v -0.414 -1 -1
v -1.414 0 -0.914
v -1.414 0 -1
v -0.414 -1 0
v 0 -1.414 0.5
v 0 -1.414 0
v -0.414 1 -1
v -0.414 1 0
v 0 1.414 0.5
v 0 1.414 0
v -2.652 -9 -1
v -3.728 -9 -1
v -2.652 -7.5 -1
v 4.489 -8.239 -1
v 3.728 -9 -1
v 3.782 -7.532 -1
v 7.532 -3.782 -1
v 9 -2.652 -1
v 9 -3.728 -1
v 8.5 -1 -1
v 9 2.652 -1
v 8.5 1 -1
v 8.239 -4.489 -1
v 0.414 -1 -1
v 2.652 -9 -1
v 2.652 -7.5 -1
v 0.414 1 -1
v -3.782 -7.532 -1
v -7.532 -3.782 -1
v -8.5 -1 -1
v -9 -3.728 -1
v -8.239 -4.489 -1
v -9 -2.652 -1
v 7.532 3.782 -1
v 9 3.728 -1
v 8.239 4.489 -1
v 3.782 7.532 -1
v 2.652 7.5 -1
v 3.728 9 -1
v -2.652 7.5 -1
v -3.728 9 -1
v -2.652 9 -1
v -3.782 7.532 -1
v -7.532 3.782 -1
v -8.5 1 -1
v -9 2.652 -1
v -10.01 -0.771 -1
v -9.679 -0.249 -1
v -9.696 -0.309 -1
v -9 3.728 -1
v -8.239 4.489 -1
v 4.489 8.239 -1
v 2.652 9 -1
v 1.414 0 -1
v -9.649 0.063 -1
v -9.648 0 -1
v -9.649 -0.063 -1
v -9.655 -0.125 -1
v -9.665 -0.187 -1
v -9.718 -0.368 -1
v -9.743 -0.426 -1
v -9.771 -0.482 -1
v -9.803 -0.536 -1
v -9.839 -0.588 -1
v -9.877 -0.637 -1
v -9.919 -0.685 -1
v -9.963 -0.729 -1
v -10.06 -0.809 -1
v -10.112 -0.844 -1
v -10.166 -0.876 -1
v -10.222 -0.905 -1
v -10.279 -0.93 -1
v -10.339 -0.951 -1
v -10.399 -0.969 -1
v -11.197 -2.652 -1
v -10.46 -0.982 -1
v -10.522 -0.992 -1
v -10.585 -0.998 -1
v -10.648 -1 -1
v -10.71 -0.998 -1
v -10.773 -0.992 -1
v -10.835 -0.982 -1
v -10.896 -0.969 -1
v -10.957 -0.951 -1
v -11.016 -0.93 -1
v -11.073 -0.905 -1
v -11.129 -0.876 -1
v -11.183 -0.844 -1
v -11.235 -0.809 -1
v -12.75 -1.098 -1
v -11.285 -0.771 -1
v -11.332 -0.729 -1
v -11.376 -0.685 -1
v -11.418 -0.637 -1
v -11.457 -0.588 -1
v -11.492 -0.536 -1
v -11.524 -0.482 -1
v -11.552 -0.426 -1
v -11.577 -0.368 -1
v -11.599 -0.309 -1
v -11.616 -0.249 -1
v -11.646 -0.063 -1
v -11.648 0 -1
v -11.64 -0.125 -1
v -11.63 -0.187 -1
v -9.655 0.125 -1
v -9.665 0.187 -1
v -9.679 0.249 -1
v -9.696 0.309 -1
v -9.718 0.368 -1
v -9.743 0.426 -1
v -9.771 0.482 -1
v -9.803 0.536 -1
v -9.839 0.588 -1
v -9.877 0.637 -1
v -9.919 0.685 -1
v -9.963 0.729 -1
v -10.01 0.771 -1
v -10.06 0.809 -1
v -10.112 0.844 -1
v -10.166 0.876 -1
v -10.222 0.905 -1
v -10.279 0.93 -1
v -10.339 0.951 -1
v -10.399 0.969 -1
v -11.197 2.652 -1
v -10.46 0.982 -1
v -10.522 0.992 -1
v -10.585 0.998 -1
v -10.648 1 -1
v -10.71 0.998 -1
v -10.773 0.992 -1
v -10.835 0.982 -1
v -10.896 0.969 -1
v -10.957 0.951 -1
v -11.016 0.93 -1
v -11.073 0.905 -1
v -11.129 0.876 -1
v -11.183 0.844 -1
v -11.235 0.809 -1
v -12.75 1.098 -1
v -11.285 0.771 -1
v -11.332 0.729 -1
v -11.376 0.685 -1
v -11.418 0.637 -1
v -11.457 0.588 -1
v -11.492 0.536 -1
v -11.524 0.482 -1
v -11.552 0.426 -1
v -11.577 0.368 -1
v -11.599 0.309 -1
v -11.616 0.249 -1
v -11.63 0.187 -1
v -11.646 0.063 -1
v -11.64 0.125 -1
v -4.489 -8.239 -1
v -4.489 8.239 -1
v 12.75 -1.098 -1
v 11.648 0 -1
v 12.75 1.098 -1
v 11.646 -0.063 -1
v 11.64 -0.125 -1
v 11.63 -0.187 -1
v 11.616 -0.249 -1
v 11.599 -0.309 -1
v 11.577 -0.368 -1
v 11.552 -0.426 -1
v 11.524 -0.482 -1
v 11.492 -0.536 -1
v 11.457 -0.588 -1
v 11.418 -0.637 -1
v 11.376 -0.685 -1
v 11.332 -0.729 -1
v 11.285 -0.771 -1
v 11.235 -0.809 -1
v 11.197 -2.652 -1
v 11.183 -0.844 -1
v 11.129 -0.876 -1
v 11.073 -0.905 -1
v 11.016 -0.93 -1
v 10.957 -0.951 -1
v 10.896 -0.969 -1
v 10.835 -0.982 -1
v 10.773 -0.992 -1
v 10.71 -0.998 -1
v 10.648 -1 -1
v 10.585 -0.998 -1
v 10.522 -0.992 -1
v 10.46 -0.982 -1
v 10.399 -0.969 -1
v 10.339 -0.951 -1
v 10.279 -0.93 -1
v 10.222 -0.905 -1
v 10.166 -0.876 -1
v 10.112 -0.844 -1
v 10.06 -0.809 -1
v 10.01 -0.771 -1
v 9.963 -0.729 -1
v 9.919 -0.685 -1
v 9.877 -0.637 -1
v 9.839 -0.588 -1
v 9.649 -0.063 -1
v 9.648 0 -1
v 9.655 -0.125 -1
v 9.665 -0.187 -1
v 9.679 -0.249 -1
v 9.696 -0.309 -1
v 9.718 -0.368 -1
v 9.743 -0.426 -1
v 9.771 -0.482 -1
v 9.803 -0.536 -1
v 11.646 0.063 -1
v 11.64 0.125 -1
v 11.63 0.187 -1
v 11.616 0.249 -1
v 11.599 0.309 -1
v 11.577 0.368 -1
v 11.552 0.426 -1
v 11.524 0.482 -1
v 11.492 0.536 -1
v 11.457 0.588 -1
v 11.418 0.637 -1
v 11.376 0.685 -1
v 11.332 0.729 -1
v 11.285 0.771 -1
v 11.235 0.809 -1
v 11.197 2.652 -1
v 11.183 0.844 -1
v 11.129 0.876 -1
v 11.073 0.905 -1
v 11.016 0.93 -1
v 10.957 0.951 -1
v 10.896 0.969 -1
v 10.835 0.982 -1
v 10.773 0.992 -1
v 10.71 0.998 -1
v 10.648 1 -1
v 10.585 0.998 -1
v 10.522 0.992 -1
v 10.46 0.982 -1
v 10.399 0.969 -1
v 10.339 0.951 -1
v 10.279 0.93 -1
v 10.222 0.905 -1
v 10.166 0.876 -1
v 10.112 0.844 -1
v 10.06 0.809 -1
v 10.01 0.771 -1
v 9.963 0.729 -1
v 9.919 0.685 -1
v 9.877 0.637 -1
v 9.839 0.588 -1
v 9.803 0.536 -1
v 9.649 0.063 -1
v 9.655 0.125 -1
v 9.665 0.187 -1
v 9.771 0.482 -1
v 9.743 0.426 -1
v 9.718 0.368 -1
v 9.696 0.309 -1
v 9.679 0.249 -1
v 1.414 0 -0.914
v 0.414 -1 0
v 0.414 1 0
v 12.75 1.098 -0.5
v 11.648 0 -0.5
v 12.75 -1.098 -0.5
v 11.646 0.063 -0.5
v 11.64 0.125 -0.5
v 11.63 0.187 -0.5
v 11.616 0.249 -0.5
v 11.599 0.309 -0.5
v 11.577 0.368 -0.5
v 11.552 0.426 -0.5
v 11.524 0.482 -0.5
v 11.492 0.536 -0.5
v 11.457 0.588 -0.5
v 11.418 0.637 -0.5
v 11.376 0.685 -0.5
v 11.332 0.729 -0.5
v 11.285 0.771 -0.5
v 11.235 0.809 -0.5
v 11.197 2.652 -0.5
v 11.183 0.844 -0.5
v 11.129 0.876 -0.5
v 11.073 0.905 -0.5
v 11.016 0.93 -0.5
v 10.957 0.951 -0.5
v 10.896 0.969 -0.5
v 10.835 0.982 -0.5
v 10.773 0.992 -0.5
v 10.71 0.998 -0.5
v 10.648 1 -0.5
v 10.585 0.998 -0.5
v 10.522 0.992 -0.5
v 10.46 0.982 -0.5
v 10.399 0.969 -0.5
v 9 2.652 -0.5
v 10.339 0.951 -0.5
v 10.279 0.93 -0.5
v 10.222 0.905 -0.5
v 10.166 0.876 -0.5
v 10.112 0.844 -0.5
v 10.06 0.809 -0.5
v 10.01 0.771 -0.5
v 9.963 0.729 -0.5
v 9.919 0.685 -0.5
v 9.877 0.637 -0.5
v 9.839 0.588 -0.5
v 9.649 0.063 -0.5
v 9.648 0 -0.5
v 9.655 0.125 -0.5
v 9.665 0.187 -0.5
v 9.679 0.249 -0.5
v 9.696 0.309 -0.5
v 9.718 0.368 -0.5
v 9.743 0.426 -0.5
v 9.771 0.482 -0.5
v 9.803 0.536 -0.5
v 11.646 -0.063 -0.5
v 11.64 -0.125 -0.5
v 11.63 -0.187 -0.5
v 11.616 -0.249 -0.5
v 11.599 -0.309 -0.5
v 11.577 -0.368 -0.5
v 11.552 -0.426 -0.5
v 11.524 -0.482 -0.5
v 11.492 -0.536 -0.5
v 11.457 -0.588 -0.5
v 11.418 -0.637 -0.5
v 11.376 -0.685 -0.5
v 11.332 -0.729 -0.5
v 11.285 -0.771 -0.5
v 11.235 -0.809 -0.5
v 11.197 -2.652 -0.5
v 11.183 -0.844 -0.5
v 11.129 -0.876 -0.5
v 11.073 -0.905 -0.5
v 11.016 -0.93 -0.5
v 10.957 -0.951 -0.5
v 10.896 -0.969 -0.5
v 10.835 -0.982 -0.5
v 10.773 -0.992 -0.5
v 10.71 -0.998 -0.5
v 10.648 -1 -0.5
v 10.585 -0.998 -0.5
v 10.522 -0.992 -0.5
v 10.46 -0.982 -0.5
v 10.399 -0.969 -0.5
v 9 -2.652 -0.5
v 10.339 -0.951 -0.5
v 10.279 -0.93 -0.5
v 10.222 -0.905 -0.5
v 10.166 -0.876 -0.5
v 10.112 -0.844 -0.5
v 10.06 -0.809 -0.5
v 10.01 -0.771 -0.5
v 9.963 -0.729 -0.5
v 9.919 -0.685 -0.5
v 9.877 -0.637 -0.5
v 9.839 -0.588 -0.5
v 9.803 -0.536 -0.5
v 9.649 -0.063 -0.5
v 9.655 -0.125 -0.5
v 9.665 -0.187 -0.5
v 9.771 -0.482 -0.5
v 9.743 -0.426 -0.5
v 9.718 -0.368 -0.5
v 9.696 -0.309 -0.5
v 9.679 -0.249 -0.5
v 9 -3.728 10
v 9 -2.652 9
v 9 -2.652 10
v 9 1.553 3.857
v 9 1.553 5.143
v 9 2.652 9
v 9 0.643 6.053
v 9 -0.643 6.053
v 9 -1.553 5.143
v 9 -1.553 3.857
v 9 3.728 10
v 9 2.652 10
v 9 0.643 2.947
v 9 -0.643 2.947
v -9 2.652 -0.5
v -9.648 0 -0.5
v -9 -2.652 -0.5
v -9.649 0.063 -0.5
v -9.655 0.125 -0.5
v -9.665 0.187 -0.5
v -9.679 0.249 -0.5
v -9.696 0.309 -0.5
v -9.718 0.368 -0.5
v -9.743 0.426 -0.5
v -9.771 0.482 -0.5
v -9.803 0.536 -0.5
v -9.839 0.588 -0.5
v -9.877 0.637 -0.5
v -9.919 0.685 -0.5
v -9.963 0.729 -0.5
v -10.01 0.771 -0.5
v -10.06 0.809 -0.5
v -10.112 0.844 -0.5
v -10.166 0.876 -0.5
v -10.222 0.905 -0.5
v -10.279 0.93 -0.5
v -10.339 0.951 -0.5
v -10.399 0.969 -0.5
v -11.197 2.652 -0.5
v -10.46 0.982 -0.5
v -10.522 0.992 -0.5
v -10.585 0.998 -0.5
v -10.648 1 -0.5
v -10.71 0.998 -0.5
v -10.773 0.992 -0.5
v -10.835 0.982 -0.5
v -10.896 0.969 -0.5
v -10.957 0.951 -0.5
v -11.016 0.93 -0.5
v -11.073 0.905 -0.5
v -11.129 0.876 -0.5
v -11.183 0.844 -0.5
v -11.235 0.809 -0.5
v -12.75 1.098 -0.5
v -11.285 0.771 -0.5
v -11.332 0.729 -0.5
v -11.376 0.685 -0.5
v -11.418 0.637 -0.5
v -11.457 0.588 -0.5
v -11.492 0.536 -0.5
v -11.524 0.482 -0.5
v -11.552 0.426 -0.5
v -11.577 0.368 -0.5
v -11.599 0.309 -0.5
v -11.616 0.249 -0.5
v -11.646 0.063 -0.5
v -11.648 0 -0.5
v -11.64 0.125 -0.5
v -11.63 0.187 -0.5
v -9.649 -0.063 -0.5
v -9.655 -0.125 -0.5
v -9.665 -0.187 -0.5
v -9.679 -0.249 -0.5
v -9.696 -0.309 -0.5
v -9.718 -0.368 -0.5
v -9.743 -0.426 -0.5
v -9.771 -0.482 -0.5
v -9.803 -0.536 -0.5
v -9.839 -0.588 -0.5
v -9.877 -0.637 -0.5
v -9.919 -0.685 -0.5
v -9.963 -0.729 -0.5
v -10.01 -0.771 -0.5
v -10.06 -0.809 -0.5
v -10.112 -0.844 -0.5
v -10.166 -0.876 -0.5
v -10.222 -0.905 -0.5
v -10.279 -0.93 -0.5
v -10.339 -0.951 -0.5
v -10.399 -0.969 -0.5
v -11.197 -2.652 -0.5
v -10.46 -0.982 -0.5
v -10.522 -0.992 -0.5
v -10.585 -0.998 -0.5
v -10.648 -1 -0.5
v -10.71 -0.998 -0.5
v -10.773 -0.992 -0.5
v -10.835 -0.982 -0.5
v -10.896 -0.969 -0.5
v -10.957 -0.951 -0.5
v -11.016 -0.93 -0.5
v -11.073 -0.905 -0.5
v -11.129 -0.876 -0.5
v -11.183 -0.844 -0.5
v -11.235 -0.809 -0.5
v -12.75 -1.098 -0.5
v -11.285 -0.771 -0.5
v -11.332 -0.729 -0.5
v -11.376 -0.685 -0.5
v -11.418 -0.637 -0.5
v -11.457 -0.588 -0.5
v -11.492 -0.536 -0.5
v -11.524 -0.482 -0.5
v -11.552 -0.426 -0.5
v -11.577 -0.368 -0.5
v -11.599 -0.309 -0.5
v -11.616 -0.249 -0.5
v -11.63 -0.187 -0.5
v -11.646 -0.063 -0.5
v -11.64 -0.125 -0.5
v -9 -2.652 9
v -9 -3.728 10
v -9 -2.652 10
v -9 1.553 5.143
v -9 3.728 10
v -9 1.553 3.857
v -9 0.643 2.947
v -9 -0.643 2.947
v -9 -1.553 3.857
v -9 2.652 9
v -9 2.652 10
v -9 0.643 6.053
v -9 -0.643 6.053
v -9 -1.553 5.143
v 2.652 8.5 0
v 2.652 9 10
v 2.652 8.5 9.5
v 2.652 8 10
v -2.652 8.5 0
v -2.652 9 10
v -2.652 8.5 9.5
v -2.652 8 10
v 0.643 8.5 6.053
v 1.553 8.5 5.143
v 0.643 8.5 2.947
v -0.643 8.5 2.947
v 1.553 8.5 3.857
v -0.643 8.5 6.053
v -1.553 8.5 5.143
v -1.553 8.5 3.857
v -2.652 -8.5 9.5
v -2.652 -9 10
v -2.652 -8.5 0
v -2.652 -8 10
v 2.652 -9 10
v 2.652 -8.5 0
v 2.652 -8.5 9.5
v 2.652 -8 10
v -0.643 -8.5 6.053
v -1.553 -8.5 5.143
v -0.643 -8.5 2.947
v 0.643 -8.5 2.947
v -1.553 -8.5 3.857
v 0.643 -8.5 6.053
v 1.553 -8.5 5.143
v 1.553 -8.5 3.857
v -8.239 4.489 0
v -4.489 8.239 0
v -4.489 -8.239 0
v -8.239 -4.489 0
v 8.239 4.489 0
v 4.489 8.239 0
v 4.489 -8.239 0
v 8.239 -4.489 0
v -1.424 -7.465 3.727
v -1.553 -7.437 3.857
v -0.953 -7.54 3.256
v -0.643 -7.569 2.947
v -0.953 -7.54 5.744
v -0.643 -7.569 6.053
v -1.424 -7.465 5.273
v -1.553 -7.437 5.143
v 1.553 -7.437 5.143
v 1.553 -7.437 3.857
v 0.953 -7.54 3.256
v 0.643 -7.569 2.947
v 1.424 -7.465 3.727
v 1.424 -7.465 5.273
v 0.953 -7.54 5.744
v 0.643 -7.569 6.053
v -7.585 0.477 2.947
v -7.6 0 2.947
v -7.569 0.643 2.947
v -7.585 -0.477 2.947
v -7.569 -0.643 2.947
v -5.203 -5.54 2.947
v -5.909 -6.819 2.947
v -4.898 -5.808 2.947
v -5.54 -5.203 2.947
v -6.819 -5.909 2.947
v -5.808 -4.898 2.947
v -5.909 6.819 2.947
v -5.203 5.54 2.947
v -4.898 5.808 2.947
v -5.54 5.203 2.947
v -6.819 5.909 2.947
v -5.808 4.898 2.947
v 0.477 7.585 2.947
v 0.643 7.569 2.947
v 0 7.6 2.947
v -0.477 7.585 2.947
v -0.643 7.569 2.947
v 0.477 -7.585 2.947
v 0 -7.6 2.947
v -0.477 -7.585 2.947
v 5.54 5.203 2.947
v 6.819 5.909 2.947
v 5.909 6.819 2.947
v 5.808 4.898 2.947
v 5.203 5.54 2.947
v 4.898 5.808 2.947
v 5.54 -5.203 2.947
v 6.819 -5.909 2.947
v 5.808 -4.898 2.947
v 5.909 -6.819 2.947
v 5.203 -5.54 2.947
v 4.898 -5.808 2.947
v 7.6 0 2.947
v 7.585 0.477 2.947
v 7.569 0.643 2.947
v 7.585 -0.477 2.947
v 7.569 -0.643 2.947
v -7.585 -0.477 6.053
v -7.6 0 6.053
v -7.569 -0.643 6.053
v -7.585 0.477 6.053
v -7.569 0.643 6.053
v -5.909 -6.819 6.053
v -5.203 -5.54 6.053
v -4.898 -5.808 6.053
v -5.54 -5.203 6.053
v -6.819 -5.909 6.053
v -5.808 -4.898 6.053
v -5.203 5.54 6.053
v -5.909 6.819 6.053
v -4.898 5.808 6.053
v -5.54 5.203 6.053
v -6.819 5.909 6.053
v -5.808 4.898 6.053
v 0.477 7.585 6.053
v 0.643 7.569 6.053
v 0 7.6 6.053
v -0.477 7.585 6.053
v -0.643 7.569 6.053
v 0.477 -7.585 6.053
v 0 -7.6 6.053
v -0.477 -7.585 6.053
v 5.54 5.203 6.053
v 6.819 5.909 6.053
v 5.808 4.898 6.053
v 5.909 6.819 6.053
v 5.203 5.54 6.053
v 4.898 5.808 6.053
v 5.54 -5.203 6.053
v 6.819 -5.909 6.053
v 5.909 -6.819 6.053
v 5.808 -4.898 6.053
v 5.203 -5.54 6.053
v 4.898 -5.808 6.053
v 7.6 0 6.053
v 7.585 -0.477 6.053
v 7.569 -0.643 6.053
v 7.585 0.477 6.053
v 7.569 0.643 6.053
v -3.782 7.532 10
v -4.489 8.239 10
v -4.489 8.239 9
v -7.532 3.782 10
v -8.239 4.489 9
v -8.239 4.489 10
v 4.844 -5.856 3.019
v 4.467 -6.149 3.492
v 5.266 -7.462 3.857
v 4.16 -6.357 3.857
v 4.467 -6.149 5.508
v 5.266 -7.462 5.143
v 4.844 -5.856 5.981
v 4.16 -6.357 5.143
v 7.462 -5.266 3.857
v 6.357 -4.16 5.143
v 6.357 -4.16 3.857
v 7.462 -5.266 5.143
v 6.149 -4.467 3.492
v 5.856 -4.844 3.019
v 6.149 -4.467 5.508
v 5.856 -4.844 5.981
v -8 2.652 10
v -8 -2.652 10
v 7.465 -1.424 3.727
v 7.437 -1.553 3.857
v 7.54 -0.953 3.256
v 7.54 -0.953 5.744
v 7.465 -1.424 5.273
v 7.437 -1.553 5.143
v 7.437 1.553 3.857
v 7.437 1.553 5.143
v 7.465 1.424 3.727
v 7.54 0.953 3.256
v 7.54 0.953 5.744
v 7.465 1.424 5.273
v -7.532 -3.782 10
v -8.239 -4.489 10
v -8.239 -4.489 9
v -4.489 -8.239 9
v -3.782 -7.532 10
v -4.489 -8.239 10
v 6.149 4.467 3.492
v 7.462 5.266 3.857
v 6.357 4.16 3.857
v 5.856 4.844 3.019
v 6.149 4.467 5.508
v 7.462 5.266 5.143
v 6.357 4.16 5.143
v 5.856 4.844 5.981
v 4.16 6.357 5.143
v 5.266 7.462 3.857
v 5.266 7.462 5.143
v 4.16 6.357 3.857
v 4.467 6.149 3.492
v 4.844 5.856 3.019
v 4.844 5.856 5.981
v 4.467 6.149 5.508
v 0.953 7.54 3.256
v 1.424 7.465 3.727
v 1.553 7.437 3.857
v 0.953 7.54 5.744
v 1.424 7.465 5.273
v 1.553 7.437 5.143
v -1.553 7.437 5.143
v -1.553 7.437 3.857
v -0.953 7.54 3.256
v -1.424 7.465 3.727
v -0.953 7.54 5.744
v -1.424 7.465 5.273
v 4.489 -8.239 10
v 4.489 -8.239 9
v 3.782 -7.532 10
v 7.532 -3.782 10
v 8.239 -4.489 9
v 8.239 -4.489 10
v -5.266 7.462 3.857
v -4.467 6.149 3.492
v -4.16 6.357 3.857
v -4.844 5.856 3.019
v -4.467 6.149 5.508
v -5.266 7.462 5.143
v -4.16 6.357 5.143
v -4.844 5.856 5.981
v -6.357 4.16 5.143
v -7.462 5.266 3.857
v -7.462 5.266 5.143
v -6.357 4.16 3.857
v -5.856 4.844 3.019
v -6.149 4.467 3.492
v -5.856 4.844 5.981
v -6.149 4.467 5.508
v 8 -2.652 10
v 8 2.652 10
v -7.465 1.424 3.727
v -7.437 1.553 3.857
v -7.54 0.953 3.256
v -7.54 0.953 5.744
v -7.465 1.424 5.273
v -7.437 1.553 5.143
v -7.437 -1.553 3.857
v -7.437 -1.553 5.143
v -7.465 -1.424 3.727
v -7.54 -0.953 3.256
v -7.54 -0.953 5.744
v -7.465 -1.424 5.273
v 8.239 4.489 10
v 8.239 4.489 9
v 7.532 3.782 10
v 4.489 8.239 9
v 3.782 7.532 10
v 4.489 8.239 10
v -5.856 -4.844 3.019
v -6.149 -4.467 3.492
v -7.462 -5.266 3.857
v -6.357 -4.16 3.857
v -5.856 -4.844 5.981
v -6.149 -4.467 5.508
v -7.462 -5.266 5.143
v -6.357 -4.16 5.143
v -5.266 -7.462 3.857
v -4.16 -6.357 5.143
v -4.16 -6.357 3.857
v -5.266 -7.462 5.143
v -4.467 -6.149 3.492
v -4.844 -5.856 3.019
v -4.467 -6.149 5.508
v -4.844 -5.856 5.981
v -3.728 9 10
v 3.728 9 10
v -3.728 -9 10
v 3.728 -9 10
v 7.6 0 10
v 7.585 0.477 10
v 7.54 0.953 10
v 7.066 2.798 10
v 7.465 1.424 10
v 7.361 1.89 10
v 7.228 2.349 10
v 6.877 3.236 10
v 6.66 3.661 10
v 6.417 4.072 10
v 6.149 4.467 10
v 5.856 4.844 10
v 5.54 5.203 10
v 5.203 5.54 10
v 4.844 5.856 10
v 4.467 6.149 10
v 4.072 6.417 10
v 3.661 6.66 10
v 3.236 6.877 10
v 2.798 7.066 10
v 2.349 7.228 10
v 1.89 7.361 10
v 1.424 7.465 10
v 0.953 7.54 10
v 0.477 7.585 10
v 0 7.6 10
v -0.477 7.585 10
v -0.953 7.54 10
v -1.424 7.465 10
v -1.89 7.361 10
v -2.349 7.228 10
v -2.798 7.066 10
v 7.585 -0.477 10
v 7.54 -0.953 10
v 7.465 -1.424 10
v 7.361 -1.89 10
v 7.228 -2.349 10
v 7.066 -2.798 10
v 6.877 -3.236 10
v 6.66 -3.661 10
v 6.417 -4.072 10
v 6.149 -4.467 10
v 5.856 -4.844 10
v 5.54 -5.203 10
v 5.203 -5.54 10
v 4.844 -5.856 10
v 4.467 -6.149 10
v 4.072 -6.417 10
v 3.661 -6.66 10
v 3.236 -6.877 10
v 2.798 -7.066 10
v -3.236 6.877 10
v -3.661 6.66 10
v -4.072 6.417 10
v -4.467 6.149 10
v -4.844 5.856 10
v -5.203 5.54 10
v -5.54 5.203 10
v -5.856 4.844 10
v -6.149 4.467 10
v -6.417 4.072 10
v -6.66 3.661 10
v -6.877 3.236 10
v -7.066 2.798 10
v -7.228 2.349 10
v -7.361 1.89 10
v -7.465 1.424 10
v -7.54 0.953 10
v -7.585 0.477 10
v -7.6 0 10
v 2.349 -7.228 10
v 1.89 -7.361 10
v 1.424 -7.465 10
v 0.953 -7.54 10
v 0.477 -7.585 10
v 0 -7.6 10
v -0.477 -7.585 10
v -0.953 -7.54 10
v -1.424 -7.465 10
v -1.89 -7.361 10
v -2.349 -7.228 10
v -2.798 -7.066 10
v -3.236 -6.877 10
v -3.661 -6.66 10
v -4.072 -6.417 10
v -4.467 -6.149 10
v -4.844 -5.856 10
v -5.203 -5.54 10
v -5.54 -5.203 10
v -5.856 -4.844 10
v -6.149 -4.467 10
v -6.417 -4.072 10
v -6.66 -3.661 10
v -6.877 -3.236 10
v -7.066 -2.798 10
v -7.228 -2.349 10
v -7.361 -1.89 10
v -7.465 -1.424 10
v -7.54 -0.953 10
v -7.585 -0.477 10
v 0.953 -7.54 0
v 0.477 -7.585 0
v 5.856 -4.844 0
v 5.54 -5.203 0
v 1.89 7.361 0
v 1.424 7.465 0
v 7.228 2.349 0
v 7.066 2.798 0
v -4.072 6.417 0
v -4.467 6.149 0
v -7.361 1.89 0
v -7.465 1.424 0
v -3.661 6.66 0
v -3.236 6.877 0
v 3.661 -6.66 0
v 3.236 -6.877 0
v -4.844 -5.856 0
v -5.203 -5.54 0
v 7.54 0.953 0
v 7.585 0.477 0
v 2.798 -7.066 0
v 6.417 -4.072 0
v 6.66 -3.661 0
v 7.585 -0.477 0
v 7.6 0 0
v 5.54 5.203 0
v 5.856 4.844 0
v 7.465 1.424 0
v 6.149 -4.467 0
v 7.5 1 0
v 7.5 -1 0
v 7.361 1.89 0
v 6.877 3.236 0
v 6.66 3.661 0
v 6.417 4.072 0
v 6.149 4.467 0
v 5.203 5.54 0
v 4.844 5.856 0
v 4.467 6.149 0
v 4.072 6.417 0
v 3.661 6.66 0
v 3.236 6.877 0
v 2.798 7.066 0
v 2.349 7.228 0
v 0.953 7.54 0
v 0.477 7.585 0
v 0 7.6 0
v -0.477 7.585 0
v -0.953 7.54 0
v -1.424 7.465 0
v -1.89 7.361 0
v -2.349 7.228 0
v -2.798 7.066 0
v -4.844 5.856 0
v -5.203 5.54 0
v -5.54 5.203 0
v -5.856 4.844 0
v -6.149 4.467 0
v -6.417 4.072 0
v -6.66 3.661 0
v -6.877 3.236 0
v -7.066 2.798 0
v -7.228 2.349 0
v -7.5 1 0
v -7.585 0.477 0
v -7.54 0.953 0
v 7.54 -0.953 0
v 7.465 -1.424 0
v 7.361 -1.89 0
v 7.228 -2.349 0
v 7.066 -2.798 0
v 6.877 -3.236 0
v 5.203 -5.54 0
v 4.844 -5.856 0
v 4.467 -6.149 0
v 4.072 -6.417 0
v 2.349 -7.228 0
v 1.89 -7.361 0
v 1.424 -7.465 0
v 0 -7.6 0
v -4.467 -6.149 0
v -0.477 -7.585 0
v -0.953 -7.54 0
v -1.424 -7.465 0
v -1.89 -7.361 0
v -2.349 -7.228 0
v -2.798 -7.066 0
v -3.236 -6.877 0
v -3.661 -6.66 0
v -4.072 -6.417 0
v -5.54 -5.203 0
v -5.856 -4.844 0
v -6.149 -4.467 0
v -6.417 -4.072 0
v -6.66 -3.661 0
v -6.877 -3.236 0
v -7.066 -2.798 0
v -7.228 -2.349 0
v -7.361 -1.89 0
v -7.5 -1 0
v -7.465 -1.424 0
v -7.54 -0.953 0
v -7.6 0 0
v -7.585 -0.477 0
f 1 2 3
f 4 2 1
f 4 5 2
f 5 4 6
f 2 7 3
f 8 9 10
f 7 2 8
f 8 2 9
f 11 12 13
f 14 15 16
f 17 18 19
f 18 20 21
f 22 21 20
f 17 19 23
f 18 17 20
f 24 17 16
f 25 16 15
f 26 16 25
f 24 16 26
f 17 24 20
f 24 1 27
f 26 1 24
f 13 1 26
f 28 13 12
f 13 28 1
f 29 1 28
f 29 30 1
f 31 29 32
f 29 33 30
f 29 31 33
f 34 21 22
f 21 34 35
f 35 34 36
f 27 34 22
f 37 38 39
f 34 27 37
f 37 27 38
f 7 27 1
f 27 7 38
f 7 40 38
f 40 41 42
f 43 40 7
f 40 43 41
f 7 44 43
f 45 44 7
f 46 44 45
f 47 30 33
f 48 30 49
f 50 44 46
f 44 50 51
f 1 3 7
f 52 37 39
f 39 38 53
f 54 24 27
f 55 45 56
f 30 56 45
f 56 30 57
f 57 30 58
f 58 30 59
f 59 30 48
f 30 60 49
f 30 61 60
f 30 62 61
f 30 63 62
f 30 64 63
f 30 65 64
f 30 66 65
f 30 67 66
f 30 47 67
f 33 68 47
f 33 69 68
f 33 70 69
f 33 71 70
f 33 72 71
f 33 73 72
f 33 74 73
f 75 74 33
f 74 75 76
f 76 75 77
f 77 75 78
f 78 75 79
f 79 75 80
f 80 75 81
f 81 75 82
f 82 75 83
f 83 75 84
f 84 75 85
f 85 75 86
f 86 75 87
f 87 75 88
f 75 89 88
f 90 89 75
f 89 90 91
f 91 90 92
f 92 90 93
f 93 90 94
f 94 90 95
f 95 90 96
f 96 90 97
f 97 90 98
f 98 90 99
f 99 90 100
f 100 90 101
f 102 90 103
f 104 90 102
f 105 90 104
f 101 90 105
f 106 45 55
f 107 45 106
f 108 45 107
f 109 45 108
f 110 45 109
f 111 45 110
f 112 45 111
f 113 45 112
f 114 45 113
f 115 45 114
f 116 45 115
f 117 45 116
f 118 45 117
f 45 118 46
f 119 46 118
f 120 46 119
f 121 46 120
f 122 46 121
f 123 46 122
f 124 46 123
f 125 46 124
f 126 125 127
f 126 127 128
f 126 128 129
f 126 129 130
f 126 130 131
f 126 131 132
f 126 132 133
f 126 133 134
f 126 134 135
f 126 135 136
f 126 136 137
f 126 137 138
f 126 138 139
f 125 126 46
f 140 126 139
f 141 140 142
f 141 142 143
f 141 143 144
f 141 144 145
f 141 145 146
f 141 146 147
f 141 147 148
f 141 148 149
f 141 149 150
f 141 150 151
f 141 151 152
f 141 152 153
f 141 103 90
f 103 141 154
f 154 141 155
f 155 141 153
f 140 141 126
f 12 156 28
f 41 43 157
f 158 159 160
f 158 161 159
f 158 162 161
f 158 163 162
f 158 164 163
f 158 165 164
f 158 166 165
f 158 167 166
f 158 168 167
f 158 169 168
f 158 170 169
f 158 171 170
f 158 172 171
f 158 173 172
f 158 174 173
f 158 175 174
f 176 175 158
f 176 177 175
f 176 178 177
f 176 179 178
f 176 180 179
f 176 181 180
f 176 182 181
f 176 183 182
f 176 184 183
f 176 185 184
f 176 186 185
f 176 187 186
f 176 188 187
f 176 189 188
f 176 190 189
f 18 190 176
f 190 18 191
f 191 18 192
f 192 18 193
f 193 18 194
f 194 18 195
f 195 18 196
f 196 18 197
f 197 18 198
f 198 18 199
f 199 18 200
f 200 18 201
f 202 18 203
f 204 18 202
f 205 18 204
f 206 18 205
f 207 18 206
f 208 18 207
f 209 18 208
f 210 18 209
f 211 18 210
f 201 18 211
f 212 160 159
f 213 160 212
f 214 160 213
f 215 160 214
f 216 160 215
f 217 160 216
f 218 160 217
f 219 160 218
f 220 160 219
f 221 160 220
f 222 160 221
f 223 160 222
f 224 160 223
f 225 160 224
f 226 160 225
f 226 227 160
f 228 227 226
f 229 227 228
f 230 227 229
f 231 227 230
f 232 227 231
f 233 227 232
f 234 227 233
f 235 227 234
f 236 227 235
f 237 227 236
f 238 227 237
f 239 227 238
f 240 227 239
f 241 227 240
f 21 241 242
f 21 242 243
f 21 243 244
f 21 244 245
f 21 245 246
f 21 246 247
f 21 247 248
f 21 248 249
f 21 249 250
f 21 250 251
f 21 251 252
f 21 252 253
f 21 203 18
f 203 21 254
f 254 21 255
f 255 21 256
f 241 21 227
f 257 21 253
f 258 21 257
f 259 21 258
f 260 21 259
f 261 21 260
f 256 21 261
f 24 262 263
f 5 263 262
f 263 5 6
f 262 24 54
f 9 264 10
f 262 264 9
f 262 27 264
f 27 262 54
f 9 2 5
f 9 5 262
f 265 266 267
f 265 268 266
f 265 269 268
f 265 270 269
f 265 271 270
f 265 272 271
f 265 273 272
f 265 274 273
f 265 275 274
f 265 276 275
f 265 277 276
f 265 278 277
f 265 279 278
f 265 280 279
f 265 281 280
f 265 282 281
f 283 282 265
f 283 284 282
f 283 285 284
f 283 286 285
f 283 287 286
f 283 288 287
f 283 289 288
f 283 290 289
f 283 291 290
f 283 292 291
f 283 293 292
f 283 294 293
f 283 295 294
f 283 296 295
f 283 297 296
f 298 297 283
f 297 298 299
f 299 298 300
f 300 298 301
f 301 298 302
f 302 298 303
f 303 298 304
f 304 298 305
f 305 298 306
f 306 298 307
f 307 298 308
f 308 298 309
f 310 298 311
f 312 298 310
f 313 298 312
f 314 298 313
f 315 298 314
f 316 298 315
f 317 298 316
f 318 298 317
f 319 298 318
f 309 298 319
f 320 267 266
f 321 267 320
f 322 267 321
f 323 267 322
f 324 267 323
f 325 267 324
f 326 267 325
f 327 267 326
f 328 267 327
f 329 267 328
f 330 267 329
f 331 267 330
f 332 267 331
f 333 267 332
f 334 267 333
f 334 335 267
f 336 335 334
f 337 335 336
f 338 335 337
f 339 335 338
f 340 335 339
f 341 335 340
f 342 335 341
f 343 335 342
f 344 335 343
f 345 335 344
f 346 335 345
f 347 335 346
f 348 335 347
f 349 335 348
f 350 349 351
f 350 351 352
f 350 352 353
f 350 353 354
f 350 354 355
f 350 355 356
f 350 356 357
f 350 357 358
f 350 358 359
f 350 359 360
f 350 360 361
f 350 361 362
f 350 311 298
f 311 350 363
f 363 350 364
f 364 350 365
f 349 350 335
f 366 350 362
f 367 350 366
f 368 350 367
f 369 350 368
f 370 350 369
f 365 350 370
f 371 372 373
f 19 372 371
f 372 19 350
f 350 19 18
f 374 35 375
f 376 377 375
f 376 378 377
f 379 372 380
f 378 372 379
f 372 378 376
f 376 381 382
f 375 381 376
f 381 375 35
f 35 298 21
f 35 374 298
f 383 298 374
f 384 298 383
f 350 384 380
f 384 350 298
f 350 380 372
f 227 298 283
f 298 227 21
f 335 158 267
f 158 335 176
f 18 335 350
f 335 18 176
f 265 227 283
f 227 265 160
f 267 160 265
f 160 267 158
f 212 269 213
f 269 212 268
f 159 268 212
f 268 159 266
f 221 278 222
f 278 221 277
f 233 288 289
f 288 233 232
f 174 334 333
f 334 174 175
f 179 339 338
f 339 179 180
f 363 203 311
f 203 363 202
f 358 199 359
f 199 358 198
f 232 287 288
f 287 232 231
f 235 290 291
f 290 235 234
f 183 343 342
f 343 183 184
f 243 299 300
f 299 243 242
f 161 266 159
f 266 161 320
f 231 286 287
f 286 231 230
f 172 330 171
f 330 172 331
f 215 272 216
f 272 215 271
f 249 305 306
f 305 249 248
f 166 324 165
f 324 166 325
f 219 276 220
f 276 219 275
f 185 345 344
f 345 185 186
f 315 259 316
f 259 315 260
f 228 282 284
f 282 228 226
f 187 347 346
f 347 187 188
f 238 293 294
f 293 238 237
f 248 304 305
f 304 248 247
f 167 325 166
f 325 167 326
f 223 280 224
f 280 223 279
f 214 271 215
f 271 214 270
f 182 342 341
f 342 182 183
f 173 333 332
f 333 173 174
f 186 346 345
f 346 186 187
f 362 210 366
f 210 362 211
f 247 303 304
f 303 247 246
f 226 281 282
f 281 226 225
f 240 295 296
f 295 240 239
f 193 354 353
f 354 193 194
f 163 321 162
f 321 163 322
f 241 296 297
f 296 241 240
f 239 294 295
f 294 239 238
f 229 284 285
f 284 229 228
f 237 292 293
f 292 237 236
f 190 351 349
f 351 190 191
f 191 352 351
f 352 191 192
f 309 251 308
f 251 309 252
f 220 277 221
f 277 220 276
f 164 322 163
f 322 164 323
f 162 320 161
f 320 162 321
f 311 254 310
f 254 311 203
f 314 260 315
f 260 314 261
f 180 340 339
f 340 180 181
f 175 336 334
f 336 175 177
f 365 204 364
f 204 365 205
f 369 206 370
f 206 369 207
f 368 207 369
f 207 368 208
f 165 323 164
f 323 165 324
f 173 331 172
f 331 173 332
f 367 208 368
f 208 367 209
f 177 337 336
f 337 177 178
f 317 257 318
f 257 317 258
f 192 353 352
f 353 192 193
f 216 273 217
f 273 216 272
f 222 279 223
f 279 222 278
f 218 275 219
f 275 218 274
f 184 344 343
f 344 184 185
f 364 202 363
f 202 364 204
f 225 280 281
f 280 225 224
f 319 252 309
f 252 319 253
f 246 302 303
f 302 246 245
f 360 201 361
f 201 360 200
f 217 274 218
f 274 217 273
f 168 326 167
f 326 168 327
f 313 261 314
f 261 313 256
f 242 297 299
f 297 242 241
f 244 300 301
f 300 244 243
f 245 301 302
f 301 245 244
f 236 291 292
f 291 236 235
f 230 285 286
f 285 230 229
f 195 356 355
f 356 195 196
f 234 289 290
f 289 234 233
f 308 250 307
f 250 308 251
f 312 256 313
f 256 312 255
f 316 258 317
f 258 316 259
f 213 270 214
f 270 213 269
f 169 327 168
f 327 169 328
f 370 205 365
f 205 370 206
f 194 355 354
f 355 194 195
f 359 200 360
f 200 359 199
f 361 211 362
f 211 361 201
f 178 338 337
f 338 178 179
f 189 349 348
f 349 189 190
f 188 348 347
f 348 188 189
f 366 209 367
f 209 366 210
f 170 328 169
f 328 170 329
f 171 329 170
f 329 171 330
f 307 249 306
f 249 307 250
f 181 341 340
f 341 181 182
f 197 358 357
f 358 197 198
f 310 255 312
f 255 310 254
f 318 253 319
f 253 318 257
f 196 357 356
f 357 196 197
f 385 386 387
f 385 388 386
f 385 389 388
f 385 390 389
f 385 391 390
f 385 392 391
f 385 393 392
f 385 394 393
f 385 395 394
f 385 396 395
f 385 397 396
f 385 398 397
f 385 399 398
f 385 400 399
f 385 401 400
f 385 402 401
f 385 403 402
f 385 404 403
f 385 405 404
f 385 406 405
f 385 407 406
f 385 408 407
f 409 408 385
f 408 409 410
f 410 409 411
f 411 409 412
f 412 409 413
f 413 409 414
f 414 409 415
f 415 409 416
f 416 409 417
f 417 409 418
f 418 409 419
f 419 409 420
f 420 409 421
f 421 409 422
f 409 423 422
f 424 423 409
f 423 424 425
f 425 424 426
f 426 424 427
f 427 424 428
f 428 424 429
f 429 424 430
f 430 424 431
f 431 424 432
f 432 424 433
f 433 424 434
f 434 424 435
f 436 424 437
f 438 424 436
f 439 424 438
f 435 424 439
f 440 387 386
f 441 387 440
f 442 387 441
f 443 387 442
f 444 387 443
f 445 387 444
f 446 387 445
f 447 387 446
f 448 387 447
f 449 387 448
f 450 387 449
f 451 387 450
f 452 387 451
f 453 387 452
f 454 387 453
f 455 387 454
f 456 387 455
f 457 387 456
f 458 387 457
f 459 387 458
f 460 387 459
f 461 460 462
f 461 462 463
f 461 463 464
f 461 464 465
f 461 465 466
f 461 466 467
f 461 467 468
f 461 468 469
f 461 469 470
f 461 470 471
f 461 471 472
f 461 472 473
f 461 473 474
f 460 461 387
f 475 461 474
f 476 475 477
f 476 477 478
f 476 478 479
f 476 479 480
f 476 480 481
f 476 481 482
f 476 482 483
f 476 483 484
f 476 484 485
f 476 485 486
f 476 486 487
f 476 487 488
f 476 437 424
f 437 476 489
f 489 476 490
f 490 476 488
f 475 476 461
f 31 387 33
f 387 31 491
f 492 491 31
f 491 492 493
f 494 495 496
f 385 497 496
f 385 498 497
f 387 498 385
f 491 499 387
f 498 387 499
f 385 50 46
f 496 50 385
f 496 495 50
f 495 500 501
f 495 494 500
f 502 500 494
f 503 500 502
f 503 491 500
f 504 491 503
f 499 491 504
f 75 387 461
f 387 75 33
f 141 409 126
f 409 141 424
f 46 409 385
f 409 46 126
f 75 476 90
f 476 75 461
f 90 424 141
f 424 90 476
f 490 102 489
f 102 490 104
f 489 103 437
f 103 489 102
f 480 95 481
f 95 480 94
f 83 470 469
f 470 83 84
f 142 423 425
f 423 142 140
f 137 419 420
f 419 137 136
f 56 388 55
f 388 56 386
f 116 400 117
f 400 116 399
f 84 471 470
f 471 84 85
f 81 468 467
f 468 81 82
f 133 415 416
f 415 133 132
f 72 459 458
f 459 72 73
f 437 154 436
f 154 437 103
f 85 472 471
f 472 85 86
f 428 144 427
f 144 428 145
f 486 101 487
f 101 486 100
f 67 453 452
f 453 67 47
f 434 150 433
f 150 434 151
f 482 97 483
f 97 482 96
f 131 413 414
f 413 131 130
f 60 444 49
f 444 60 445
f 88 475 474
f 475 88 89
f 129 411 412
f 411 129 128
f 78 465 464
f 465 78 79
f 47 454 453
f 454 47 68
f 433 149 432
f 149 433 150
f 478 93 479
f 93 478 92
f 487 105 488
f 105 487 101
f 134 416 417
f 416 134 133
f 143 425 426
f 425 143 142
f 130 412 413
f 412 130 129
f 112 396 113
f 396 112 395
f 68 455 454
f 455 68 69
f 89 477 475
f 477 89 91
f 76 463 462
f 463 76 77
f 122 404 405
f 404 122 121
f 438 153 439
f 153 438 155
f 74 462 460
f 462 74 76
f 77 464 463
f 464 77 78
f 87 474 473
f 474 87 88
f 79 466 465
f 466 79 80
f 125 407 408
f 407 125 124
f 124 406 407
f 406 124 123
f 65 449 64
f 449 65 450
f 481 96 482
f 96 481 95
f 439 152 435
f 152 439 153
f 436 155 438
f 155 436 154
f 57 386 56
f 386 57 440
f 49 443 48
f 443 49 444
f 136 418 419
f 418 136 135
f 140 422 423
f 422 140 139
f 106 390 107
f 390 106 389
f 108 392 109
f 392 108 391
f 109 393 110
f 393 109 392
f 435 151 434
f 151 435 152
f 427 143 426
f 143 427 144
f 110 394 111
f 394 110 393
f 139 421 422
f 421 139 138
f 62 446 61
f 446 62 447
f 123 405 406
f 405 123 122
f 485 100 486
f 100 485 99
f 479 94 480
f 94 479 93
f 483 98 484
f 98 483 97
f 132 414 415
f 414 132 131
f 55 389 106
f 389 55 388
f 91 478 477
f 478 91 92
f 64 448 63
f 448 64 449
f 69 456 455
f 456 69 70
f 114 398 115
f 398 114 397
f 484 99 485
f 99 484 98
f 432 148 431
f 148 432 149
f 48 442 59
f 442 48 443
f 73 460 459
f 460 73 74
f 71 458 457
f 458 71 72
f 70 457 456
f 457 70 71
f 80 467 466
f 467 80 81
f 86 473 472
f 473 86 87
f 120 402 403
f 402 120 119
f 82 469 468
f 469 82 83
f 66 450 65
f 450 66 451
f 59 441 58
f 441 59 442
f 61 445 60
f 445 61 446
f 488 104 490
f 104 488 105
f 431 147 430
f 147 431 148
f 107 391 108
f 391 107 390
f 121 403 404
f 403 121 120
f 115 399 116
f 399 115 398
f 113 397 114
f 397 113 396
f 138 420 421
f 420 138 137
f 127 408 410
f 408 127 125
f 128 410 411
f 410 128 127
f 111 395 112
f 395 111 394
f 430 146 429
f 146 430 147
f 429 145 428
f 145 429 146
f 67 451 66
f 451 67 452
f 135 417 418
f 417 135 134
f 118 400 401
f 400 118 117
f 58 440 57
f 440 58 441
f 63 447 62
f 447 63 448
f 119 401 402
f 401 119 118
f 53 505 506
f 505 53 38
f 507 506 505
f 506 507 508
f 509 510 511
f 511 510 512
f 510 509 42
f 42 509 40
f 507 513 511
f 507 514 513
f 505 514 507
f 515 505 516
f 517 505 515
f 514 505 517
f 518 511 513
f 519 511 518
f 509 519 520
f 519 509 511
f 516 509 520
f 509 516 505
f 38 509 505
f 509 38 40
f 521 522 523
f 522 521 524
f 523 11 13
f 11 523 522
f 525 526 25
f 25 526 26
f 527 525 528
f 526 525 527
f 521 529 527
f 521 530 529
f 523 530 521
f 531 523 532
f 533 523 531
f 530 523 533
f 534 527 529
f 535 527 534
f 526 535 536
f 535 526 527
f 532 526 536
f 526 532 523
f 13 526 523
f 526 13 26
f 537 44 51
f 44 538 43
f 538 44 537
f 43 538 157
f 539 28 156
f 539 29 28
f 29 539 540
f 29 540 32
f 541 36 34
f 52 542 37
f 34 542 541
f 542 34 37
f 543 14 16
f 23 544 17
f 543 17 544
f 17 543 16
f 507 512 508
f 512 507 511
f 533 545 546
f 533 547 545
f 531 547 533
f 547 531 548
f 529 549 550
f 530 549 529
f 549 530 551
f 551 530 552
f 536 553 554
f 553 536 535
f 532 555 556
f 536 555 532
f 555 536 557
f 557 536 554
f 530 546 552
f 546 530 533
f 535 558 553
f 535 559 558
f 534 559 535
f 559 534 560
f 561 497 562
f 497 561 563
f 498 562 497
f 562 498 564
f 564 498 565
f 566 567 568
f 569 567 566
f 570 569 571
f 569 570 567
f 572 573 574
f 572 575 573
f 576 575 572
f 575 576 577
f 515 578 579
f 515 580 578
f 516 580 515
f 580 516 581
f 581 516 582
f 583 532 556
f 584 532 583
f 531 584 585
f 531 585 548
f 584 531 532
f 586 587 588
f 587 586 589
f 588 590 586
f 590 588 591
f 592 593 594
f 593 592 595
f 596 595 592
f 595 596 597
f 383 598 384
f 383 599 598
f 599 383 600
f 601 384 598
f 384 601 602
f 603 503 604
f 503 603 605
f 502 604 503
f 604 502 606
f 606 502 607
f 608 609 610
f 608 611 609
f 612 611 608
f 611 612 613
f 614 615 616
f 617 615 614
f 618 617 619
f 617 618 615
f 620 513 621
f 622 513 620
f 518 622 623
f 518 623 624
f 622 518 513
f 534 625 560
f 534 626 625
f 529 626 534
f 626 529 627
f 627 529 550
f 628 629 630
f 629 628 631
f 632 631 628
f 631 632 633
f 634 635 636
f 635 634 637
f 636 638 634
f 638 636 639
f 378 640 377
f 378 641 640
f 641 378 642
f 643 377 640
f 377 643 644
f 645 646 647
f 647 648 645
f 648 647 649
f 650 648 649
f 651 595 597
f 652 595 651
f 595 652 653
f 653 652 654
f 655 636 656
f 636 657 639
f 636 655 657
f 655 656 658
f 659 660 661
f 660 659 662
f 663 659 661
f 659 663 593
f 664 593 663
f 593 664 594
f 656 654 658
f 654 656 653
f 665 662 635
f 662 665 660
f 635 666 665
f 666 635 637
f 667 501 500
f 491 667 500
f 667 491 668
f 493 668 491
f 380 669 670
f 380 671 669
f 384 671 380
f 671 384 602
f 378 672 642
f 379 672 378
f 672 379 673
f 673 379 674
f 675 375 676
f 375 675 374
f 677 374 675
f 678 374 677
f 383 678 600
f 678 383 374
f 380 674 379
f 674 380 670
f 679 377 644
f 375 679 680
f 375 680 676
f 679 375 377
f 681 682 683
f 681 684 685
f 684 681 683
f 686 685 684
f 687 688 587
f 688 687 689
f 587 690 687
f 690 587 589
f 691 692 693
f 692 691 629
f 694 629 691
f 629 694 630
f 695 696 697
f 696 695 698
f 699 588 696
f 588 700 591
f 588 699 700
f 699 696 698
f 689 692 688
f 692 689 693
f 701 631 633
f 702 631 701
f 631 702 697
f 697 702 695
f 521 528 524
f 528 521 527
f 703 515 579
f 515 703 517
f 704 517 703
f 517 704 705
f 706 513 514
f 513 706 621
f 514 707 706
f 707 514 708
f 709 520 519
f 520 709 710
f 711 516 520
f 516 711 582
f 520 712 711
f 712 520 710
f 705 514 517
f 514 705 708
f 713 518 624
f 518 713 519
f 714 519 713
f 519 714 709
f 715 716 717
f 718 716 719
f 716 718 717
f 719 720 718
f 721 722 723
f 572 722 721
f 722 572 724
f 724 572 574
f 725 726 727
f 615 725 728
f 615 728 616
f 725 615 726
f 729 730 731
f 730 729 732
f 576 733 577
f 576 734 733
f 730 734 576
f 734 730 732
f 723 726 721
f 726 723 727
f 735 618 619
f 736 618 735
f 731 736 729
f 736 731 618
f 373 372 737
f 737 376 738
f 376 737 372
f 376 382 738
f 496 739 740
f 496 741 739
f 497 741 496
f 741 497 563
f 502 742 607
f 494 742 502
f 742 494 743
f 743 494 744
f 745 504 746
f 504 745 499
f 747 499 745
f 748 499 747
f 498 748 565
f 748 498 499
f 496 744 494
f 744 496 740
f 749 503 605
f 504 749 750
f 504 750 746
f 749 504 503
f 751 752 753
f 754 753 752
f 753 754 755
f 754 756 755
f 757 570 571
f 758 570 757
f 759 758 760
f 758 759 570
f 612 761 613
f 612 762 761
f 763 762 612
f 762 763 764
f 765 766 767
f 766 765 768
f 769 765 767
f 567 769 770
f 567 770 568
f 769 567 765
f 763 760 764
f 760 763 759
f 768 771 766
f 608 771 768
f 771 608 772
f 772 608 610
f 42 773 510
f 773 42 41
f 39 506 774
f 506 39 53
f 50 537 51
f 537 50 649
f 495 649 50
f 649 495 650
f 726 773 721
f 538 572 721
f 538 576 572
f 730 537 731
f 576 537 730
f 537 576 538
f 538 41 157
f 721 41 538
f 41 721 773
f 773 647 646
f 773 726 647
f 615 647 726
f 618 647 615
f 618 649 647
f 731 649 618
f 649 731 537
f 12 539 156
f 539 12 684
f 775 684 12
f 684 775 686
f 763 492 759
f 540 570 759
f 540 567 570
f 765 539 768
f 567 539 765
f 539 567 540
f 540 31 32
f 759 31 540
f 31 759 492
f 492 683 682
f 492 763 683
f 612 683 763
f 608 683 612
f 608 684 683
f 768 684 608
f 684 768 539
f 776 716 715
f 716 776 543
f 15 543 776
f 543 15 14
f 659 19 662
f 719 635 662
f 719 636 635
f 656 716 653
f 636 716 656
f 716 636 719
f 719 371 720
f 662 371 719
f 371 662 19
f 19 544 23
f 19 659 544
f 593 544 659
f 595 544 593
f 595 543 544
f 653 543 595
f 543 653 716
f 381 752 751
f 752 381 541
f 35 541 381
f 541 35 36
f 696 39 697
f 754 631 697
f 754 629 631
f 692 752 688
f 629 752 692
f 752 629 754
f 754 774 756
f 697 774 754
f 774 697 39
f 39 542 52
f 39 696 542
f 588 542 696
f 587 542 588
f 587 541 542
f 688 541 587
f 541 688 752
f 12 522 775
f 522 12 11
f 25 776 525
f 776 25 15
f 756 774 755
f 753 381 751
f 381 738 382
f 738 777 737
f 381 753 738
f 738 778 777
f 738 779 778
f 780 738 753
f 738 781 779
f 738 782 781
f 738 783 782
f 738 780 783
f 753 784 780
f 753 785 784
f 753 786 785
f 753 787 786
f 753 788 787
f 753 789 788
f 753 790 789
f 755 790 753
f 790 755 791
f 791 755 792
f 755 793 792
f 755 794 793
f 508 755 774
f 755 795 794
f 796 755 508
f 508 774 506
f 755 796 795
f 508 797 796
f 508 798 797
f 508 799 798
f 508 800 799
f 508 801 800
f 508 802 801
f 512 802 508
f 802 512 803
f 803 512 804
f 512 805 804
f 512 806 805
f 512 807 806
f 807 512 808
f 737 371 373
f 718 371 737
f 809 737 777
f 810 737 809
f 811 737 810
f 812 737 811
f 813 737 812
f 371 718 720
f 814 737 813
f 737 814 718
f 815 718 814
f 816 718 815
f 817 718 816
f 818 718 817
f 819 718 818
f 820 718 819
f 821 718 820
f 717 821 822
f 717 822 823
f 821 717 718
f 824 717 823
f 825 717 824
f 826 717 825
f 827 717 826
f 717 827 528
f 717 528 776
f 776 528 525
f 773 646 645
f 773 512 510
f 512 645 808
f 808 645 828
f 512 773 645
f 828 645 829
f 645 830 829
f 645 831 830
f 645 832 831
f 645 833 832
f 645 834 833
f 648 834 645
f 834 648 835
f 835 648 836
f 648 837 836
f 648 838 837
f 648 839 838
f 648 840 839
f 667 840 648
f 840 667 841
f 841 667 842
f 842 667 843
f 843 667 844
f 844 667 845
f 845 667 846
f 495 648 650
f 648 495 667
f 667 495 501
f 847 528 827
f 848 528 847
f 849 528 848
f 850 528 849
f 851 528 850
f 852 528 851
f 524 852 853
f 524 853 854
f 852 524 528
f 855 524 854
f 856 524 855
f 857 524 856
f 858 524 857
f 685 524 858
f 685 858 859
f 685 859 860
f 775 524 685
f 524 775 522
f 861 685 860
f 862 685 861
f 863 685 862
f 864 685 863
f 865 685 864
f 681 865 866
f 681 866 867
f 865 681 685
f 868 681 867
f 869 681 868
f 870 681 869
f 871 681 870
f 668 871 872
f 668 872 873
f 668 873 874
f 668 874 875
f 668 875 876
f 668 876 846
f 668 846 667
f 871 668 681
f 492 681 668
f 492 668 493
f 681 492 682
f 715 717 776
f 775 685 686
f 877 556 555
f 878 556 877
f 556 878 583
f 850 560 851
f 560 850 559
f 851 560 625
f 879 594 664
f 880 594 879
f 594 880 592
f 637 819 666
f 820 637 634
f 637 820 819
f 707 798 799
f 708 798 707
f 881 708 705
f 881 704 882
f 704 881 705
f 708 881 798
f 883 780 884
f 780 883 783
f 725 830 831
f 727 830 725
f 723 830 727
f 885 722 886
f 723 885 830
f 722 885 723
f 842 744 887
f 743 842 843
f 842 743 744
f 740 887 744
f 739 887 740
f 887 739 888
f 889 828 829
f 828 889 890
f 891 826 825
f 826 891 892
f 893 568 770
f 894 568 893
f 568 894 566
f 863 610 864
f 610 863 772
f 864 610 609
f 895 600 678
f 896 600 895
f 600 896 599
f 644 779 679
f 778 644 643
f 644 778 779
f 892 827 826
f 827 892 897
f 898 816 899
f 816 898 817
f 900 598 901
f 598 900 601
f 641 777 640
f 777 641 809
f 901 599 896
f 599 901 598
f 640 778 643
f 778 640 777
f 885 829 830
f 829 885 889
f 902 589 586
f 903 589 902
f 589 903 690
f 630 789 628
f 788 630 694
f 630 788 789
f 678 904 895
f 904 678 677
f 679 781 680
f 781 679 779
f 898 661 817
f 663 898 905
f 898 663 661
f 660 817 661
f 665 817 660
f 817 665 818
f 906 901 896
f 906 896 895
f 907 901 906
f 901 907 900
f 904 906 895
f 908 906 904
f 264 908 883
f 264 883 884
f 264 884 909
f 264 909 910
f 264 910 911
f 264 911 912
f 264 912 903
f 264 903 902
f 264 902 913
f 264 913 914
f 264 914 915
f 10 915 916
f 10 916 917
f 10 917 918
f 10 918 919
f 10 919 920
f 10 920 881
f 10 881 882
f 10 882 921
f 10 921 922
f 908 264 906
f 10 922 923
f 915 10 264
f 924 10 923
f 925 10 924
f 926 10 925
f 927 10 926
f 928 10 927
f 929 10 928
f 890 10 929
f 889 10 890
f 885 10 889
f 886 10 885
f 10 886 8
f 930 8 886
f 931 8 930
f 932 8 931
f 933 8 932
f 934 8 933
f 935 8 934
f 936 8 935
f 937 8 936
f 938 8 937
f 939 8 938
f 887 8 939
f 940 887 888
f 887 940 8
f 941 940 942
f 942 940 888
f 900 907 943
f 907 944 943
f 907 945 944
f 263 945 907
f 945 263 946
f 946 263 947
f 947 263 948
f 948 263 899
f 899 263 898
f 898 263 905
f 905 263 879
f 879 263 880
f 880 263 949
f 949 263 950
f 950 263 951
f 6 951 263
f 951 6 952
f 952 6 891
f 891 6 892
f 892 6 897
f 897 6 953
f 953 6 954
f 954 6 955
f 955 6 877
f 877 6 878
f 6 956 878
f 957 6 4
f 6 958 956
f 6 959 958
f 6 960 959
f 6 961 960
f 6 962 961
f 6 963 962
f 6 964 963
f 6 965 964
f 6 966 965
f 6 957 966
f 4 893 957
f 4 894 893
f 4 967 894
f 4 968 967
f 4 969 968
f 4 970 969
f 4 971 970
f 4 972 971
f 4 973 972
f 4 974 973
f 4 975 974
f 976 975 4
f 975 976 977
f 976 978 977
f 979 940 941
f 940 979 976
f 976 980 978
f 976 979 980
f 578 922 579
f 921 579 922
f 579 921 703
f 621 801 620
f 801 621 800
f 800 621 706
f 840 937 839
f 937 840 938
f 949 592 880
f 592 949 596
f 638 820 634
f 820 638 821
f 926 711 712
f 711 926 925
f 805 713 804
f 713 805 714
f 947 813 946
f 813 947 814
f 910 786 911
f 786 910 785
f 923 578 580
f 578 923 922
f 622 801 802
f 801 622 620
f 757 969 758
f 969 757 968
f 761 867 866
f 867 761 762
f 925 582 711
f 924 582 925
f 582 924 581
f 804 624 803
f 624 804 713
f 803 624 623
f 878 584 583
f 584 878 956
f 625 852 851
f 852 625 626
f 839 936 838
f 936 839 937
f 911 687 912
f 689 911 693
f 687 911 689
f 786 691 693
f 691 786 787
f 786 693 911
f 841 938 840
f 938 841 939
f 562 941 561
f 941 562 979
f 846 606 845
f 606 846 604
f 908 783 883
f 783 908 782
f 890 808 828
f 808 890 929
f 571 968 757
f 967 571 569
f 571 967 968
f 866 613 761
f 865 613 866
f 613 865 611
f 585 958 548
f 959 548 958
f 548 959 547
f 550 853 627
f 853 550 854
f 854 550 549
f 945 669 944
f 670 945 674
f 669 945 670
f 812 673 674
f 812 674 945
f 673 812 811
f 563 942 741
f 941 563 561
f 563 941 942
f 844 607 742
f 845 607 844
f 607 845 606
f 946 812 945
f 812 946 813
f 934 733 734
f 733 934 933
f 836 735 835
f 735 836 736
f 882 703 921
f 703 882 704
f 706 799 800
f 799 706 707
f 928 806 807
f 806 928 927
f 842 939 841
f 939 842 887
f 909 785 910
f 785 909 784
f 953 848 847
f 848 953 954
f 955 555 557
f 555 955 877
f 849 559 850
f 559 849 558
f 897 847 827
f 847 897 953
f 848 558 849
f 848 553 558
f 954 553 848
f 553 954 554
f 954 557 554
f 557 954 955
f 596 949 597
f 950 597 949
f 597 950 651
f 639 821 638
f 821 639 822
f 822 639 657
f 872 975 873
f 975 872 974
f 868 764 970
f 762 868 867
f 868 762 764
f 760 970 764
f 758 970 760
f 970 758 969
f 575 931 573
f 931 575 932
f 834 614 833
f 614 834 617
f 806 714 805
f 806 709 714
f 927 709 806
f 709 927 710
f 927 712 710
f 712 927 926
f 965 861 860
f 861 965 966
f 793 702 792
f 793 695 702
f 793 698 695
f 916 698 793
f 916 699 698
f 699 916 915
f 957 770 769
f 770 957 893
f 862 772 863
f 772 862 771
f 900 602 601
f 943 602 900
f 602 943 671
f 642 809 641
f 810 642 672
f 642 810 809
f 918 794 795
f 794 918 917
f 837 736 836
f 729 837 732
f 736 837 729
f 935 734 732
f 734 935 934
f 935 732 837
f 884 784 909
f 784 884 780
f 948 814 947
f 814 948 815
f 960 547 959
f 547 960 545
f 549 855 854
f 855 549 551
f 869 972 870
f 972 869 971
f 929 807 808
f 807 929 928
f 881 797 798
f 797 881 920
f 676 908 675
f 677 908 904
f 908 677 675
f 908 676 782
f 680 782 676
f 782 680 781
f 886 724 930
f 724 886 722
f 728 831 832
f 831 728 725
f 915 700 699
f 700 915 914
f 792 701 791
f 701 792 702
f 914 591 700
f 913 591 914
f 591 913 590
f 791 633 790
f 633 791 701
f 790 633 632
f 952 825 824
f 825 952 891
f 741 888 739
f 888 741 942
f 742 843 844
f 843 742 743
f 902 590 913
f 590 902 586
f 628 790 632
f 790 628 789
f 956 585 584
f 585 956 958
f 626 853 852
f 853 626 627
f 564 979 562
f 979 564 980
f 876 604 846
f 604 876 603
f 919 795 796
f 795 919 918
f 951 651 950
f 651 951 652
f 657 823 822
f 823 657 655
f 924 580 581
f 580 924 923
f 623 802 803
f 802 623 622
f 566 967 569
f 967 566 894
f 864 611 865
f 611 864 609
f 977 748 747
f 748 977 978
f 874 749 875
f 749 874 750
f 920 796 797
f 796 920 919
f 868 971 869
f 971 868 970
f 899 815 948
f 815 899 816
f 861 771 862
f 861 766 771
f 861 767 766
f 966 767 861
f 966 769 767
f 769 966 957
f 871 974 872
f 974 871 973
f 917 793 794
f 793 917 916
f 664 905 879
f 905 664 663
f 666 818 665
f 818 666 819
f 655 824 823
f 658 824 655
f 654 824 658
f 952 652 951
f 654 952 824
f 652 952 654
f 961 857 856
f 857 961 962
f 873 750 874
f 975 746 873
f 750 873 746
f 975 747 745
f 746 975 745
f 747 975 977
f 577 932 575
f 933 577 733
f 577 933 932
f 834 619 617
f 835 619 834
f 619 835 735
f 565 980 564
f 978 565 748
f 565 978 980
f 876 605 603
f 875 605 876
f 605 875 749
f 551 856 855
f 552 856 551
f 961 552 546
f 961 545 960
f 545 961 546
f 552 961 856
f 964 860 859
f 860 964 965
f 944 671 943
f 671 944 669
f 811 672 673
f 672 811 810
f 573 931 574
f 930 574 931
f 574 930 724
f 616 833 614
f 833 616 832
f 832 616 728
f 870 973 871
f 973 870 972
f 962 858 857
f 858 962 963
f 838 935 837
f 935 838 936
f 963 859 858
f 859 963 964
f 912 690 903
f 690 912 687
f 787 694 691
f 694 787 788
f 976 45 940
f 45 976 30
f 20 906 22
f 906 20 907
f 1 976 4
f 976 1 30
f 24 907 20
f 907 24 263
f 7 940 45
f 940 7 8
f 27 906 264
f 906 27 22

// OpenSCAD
BAT_R = 15/2;
WALL_WIDTH = 1.5;
TOL = 0.1;

BOTTOM_HEIGHT = 1;
HEIGHT = 10;

SLIT_WIDTH = 2;
SLIT_HEIGHT = 0.5;

RUBBER_WIDTH = BAT_R/sqrt(2);
RUBBER_GUIDE_DEPTH = WALL_WIDTH/3;

NUB_SIDE = SLIT_WIDTH;
NUB_HEIGHT = 0.5;

TAB_HEIGHT = 0.5;
TAB_WIDTH = BAT_R/sqrt(2);
SCREW_R = 1;

$fn = 100;

module plate (h, l, w) {
    translate ([-h/2, -l/2, 0]) {
        cube ([h, l, w]);
    }
}

module octa_prism (span, height) {
    a = span / (1 + sqrt(2));
    hull () {
        plate (span, a, height);
        plate (a, span, height);
    }
}

module ramp_cutout () {
    translate ([-RUBBER_WIDTH/2, BAT_R, -BOTTOM_HEIGHT]) {
       rotate ([-45, 0, 0]) cube ([RUBBER_WIDTH, BAT_R, BAT_R]);
    }
}

module guide_cutout () {
    translate ([-RUBBER_WIDTH/2, BAT_R+WALL_WIDTH-RUBBER_GUIDE_DEPTH, -BOTTOM_HEIGHT]) {
       cube ([RUBBER_WIDTH, HEIGHT*10, HEIGHT*10]);
    }
}

module tab () {
    a = TAB_WIDTH / (1+sqrt(2));
    difference () {
        intersection () {
            translate ([0, -BAT_R, 0]) cube ([BAT_R*2, BAT_R*2, TAB_HEIGHT]);
            translate ([a/2, 0, 0]) octa_prism (TAB_WIDTH, TAB_HEIGHT);
        }
        translate ([a*3/4, 0, -HEIGHT/2]) cylinder(HEIGHT, r=SCREW_R);
    }
}

union () {
    translate ([0, 0, -BOTTOM_HEIGHT]) {
        intersection () {
            rotate ([0, 0, 45]) plate (NUB_SIDE, NUB_SIDE, BOTTOM_HEIGHT+NUB_HEIGHT);
            translate ([0, -BAT_R/2, BOTTOM_HEIGHT+NUB_HEIGHT]) {
                rotate ([0, 135, 0]) cube ([BAT_R, BAT_R, BAT_R]);
            }
        }
    }
    for (a=[0, 180]) rotate ([0, 0, a]) {
        translate ([BAT_R+WALL_WIDTH, 0, -BOTTOM_HEIGHT]) {
            tab ();
        }
    }
    difference () {
        union () {
            translate ([0, 0, -BOTTOM_HEIGHT]) {
                octa_prism ((BAT_R+WALL_WIDTH)*2, HEIGHT+BOTTOM_HEIGHT);
            }
        }
        cylinder (HEIGHT*100, r=BAT_R+TOL);
        translate ([0, -SLIT_WIDTH/2, -BOTTOM_HEIGHT+(BAT_R+WALL_WIDTH)-RUBBER_GUIDE_DEPTH]) {
            rotate ([0, 90+45, 0]) cube ([BAT_R*10, SLIT_WIDTH, BAT_R*10]);
        }
        for (a=[0, 180]) rotate ([0, 0, a]) {
            guide_cutout ();
            ramp_cutout ();
        }
        for (a=[45, 135, -45, -135]) rotate ([0, 0, a]) {
            translate ([0, 0, -RUBBER_GUIDE_DEPTH]) ramp_cutout ();
        }
        for (a=[0:8]) rotate ([0, 0, a*45]) {
            translate ([0, 0, HEIGHT+BOTTOM_HEIGHT+RUBBER_GUIDE_DEPTH]) ramp_cutout ();
            translate ([0, 0, (HEIGHT-BOTTOM_HEIGHT)/2]) {
                rotate ([90, 0, 0]) octa_prism (BAT_R/(1+sqrt(2)), BAT_R*10);
            }
        }
    }
}
